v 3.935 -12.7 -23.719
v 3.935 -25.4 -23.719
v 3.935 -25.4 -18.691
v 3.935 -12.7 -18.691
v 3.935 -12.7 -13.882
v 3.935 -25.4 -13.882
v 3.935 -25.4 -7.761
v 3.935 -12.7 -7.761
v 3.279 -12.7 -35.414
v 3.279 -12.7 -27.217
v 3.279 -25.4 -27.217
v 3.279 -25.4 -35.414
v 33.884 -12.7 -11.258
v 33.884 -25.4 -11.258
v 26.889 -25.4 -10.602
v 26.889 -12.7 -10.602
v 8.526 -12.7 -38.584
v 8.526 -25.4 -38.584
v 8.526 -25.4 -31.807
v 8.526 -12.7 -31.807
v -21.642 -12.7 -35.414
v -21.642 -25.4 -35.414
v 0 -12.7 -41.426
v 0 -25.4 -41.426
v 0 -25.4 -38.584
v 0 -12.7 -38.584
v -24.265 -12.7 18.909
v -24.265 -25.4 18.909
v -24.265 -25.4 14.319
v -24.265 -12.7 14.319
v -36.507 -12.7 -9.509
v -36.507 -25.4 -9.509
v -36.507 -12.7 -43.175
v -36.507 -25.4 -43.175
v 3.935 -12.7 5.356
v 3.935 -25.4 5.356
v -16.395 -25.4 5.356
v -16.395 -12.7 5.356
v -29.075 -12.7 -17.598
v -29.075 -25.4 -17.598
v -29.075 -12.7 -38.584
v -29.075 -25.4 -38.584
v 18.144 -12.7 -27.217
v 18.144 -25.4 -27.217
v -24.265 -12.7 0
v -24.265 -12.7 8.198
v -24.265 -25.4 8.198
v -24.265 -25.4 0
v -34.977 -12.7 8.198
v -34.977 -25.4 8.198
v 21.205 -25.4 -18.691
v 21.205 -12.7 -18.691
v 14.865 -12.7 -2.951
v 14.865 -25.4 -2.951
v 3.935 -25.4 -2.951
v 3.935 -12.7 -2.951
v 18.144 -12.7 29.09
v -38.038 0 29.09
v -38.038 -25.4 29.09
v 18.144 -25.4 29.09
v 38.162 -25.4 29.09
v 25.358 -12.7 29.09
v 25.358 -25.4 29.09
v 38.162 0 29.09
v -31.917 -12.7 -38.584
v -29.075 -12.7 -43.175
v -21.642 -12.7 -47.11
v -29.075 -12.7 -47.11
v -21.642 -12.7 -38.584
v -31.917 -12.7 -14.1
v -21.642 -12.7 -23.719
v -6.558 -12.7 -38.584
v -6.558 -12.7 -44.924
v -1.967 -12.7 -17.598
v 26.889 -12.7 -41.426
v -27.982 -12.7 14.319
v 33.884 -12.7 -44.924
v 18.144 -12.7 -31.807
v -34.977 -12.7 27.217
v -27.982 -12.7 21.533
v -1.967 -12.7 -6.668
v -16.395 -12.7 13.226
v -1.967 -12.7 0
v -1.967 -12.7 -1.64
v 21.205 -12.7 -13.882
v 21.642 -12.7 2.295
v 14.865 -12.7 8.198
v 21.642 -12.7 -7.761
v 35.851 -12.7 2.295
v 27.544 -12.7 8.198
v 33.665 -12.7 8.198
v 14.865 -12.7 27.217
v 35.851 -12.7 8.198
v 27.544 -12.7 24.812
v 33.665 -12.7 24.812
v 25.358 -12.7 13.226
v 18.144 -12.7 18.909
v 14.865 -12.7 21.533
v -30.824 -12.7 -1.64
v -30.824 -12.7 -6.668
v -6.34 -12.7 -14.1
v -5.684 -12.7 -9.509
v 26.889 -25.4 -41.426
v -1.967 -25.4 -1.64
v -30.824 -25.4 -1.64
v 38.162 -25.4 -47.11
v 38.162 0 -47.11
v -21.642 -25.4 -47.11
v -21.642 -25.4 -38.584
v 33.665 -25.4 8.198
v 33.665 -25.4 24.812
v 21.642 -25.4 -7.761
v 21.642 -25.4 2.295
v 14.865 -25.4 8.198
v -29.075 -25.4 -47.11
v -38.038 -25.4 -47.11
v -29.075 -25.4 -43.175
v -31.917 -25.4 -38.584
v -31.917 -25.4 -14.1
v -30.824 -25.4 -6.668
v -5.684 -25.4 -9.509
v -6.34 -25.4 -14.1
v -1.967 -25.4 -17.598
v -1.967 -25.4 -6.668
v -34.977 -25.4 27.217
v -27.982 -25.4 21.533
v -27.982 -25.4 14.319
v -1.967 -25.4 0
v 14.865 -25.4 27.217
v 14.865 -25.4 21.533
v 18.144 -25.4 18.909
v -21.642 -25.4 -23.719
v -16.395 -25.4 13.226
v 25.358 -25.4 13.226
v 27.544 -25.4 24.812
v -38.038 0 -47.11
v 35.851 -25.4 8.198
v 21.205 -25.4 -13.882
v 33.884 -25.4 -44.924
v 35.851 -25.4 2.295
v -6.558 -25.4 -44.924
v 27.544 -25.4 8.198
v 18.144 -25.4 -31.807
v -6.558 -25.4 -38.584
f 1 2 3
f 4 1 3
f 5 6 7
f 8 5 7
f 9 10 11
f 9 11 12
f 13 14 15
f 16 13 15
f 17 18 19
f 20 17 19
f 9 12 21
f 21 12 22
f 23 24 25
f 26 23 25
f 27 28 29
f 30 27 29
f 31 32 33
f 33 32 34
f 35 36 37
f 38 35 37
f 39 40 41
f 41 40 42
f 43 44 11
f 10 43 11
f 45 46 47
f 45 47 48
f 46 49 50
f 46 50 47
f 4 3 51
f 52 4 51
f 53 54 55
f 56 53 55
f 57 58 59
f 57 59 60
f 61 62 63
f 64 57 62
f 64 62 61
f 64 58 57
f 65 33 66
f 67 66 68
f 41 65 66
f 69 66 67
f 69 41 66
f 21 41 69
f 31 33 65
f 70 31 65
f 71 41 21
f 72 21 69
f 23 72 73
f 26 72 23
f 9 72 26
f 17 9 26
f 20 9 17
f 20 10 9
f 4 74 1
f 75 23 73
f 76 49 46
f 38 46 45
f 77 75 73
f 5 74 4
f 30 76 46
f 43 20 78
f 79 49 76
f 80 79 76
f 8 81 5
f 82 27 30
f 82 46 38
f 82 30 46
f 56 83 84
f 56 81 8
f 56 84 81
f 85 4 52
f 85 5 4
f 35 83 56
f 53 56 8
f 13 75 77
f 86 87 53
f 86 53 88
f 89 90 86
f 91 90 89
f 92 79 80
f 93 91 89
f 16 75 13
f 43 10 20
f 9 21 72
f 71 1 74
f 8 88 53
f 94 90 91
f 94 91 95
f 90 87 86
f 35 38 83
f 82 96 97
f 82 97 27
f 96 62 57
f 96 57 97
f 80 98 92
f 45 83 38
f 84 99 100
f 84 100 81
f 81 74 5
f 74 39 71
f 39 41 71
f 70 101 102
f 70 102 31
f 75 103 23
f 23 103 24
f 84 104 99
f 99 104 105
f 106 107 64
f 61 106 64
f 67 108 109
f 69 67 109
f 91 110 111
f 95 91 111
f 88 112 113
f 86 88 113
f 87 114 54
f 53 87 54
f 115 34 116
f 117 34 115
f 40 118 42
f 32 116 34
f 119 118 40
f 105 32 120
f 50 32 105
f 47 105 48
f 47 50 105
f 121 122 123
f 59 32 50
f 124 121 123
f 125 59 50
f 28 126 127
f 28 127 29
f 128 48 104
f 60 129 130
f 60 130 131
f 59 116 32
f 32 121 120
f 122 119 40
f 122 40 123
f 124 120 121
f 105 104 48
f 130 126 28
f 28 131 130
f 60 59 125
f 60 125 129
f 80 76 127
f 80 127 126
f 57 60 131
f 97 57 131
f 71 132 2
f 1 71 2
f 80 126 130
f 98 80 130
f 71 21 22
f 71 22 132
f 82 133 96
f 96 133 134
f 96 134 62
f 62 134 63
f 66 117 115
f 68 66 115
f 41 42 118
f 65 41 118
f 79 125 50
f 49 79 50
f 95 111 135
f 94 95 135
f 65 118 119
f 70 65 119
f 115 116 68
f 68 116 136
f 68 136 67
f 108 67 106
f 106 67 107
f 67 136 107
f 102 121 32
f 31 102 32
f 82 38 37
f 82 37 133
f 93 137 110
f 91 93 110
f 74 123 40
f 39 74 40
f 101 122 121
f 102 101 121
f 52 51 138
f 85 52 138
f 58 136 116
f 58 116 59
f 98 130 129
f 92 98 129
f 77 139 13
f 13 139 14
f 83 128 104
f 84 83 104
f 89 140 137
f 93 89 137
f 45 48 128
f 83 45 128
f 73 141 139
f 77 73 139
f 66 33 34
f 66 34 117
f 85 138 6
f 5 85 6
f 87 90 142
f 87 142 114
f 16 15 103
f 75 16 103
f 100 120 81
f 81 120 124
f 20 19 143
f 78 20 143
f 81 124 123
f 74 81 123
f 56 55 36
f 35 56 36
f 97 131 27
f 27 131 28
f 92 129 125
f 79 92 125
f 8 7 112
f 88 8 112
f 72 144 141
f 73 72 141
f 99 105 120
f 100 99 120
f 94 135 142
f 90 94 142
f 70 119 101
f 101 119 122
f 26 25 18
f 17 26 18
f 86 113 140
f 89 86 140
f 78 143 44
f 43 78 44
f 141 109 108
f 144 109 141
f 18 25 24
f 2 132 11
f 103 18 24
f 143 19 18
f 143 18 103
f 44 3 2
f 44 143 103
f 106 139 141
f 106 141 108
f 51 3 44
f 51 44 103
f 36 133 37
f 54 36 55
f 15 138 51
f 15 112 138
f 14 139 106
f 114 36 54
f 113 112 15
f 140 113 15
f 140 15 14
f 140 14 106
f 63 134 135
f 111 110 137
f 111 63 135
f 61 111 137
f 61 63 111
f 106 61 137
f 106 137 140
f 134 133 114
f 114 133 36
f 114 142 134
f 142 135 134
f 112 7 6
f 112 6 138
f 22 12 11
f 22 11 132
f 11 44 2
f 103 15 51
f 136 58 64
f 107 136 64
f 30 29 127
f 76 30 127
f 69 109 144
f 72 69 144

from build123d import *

# Parameters (mm, degrees)
F0_W     = 76.2
F0_H     = 76.2
F1_DEPTH = 25.4
F3_DEPTH = 12.7


with BuildPart() as f1:
    # F0 (on Front) → F1 (new body)
    with BuildSketch(Plane.XZ):
        with Locations((0.062458, -9.009712)):
            Rectangle(F0_W, F0_H)
    extrude(amount=F1_DEPTH)

    # F2 (on face) → F3 (cut)
    with BuildSketch(Plane.XZ.offset(25.4)):
        Polygon((-29.074673, -43.174796), (-29.074673, -47.109712), (-21.642048, -47.109712), (-21.642048, -38.584057), (-6.558197, -38.584057), (-6.558197, -44.923648), (33.884019, -44.923648), (33.884019, -11.258238), (26.888607, -10.602417), (26.888607, -41.425943), (0, -41.425943), (0, -38.584057), (8.525654, -38.584057), (8.525654, -31.807255), (18.144343, -31.807255), (18.144343, -27.216518), (3.279097, -27.216518), (3.279097, -35.414262), (-21.642048, -35.414262), (-21.642048, -23.718812), (3.934919, -23.718812), (3.934919, -18.690862), (21.204835, -18.690862), (21.204835, -13.881517), (3.934919, -13.881517), (3.934919, -7.760533), (21.64205, -7.760533), (21.64205, 2.295369), (35.851475, 2.295369), (35.851475, 8.197745), (33.665411, 8.197745), (33.665411, 24.811845), (27.544426, 24.811845), (27.544426, 8.197745), (14.865247, 8.197745), (14.865247, -2.951189), (3.934919, -2.951189), (3.934919, 5.355861), (-16.395492, 5.355861), (-16.395492, 13.225697), (25.35836, 13.225697), (25.35836, 29.090288), (18.144343, 29.090288), (18.144343, 18.909467), (-24.265327, 18.909467), (-24.265327, 14.31873), (-27.981639, 14.31873), (-27.981639, 21.532746), (14.865247, 21.532746), (14.865247, 27.216518), (-34.977049, 27.216518), (-34.977049, 8.197745), (-24.265327, 8.197745), (-24.265327, 0), (-1.967459, 0), (-1.967459, -1.639549), (-30.823525, -1.639549), (-30.823525, -6.6675), (-1.967459, -6.6675), (-1.967459, -17.597828), (-29.074673, -17.597828), (-29.074673, -38.584057), (-31.916559, -38.584057), (-31.916559, -14.100123), (-6.339591, -14.100123), (-5.683769, -9.509386), (-36.507297, -9.509386), (-36.507297, -43.174796), align=None)
        with BuildLine():
            Line((2e-06, 61.738352), (0, 55.198155))
            ThreePointArc((0, 55.198155), (1.854865, 58.468253), (2e-06, 61.738352))
        make_face()
    extrude(amount=-F3_DEPTH, mode=Mode.SUBTRACT)


solid = f1.part
